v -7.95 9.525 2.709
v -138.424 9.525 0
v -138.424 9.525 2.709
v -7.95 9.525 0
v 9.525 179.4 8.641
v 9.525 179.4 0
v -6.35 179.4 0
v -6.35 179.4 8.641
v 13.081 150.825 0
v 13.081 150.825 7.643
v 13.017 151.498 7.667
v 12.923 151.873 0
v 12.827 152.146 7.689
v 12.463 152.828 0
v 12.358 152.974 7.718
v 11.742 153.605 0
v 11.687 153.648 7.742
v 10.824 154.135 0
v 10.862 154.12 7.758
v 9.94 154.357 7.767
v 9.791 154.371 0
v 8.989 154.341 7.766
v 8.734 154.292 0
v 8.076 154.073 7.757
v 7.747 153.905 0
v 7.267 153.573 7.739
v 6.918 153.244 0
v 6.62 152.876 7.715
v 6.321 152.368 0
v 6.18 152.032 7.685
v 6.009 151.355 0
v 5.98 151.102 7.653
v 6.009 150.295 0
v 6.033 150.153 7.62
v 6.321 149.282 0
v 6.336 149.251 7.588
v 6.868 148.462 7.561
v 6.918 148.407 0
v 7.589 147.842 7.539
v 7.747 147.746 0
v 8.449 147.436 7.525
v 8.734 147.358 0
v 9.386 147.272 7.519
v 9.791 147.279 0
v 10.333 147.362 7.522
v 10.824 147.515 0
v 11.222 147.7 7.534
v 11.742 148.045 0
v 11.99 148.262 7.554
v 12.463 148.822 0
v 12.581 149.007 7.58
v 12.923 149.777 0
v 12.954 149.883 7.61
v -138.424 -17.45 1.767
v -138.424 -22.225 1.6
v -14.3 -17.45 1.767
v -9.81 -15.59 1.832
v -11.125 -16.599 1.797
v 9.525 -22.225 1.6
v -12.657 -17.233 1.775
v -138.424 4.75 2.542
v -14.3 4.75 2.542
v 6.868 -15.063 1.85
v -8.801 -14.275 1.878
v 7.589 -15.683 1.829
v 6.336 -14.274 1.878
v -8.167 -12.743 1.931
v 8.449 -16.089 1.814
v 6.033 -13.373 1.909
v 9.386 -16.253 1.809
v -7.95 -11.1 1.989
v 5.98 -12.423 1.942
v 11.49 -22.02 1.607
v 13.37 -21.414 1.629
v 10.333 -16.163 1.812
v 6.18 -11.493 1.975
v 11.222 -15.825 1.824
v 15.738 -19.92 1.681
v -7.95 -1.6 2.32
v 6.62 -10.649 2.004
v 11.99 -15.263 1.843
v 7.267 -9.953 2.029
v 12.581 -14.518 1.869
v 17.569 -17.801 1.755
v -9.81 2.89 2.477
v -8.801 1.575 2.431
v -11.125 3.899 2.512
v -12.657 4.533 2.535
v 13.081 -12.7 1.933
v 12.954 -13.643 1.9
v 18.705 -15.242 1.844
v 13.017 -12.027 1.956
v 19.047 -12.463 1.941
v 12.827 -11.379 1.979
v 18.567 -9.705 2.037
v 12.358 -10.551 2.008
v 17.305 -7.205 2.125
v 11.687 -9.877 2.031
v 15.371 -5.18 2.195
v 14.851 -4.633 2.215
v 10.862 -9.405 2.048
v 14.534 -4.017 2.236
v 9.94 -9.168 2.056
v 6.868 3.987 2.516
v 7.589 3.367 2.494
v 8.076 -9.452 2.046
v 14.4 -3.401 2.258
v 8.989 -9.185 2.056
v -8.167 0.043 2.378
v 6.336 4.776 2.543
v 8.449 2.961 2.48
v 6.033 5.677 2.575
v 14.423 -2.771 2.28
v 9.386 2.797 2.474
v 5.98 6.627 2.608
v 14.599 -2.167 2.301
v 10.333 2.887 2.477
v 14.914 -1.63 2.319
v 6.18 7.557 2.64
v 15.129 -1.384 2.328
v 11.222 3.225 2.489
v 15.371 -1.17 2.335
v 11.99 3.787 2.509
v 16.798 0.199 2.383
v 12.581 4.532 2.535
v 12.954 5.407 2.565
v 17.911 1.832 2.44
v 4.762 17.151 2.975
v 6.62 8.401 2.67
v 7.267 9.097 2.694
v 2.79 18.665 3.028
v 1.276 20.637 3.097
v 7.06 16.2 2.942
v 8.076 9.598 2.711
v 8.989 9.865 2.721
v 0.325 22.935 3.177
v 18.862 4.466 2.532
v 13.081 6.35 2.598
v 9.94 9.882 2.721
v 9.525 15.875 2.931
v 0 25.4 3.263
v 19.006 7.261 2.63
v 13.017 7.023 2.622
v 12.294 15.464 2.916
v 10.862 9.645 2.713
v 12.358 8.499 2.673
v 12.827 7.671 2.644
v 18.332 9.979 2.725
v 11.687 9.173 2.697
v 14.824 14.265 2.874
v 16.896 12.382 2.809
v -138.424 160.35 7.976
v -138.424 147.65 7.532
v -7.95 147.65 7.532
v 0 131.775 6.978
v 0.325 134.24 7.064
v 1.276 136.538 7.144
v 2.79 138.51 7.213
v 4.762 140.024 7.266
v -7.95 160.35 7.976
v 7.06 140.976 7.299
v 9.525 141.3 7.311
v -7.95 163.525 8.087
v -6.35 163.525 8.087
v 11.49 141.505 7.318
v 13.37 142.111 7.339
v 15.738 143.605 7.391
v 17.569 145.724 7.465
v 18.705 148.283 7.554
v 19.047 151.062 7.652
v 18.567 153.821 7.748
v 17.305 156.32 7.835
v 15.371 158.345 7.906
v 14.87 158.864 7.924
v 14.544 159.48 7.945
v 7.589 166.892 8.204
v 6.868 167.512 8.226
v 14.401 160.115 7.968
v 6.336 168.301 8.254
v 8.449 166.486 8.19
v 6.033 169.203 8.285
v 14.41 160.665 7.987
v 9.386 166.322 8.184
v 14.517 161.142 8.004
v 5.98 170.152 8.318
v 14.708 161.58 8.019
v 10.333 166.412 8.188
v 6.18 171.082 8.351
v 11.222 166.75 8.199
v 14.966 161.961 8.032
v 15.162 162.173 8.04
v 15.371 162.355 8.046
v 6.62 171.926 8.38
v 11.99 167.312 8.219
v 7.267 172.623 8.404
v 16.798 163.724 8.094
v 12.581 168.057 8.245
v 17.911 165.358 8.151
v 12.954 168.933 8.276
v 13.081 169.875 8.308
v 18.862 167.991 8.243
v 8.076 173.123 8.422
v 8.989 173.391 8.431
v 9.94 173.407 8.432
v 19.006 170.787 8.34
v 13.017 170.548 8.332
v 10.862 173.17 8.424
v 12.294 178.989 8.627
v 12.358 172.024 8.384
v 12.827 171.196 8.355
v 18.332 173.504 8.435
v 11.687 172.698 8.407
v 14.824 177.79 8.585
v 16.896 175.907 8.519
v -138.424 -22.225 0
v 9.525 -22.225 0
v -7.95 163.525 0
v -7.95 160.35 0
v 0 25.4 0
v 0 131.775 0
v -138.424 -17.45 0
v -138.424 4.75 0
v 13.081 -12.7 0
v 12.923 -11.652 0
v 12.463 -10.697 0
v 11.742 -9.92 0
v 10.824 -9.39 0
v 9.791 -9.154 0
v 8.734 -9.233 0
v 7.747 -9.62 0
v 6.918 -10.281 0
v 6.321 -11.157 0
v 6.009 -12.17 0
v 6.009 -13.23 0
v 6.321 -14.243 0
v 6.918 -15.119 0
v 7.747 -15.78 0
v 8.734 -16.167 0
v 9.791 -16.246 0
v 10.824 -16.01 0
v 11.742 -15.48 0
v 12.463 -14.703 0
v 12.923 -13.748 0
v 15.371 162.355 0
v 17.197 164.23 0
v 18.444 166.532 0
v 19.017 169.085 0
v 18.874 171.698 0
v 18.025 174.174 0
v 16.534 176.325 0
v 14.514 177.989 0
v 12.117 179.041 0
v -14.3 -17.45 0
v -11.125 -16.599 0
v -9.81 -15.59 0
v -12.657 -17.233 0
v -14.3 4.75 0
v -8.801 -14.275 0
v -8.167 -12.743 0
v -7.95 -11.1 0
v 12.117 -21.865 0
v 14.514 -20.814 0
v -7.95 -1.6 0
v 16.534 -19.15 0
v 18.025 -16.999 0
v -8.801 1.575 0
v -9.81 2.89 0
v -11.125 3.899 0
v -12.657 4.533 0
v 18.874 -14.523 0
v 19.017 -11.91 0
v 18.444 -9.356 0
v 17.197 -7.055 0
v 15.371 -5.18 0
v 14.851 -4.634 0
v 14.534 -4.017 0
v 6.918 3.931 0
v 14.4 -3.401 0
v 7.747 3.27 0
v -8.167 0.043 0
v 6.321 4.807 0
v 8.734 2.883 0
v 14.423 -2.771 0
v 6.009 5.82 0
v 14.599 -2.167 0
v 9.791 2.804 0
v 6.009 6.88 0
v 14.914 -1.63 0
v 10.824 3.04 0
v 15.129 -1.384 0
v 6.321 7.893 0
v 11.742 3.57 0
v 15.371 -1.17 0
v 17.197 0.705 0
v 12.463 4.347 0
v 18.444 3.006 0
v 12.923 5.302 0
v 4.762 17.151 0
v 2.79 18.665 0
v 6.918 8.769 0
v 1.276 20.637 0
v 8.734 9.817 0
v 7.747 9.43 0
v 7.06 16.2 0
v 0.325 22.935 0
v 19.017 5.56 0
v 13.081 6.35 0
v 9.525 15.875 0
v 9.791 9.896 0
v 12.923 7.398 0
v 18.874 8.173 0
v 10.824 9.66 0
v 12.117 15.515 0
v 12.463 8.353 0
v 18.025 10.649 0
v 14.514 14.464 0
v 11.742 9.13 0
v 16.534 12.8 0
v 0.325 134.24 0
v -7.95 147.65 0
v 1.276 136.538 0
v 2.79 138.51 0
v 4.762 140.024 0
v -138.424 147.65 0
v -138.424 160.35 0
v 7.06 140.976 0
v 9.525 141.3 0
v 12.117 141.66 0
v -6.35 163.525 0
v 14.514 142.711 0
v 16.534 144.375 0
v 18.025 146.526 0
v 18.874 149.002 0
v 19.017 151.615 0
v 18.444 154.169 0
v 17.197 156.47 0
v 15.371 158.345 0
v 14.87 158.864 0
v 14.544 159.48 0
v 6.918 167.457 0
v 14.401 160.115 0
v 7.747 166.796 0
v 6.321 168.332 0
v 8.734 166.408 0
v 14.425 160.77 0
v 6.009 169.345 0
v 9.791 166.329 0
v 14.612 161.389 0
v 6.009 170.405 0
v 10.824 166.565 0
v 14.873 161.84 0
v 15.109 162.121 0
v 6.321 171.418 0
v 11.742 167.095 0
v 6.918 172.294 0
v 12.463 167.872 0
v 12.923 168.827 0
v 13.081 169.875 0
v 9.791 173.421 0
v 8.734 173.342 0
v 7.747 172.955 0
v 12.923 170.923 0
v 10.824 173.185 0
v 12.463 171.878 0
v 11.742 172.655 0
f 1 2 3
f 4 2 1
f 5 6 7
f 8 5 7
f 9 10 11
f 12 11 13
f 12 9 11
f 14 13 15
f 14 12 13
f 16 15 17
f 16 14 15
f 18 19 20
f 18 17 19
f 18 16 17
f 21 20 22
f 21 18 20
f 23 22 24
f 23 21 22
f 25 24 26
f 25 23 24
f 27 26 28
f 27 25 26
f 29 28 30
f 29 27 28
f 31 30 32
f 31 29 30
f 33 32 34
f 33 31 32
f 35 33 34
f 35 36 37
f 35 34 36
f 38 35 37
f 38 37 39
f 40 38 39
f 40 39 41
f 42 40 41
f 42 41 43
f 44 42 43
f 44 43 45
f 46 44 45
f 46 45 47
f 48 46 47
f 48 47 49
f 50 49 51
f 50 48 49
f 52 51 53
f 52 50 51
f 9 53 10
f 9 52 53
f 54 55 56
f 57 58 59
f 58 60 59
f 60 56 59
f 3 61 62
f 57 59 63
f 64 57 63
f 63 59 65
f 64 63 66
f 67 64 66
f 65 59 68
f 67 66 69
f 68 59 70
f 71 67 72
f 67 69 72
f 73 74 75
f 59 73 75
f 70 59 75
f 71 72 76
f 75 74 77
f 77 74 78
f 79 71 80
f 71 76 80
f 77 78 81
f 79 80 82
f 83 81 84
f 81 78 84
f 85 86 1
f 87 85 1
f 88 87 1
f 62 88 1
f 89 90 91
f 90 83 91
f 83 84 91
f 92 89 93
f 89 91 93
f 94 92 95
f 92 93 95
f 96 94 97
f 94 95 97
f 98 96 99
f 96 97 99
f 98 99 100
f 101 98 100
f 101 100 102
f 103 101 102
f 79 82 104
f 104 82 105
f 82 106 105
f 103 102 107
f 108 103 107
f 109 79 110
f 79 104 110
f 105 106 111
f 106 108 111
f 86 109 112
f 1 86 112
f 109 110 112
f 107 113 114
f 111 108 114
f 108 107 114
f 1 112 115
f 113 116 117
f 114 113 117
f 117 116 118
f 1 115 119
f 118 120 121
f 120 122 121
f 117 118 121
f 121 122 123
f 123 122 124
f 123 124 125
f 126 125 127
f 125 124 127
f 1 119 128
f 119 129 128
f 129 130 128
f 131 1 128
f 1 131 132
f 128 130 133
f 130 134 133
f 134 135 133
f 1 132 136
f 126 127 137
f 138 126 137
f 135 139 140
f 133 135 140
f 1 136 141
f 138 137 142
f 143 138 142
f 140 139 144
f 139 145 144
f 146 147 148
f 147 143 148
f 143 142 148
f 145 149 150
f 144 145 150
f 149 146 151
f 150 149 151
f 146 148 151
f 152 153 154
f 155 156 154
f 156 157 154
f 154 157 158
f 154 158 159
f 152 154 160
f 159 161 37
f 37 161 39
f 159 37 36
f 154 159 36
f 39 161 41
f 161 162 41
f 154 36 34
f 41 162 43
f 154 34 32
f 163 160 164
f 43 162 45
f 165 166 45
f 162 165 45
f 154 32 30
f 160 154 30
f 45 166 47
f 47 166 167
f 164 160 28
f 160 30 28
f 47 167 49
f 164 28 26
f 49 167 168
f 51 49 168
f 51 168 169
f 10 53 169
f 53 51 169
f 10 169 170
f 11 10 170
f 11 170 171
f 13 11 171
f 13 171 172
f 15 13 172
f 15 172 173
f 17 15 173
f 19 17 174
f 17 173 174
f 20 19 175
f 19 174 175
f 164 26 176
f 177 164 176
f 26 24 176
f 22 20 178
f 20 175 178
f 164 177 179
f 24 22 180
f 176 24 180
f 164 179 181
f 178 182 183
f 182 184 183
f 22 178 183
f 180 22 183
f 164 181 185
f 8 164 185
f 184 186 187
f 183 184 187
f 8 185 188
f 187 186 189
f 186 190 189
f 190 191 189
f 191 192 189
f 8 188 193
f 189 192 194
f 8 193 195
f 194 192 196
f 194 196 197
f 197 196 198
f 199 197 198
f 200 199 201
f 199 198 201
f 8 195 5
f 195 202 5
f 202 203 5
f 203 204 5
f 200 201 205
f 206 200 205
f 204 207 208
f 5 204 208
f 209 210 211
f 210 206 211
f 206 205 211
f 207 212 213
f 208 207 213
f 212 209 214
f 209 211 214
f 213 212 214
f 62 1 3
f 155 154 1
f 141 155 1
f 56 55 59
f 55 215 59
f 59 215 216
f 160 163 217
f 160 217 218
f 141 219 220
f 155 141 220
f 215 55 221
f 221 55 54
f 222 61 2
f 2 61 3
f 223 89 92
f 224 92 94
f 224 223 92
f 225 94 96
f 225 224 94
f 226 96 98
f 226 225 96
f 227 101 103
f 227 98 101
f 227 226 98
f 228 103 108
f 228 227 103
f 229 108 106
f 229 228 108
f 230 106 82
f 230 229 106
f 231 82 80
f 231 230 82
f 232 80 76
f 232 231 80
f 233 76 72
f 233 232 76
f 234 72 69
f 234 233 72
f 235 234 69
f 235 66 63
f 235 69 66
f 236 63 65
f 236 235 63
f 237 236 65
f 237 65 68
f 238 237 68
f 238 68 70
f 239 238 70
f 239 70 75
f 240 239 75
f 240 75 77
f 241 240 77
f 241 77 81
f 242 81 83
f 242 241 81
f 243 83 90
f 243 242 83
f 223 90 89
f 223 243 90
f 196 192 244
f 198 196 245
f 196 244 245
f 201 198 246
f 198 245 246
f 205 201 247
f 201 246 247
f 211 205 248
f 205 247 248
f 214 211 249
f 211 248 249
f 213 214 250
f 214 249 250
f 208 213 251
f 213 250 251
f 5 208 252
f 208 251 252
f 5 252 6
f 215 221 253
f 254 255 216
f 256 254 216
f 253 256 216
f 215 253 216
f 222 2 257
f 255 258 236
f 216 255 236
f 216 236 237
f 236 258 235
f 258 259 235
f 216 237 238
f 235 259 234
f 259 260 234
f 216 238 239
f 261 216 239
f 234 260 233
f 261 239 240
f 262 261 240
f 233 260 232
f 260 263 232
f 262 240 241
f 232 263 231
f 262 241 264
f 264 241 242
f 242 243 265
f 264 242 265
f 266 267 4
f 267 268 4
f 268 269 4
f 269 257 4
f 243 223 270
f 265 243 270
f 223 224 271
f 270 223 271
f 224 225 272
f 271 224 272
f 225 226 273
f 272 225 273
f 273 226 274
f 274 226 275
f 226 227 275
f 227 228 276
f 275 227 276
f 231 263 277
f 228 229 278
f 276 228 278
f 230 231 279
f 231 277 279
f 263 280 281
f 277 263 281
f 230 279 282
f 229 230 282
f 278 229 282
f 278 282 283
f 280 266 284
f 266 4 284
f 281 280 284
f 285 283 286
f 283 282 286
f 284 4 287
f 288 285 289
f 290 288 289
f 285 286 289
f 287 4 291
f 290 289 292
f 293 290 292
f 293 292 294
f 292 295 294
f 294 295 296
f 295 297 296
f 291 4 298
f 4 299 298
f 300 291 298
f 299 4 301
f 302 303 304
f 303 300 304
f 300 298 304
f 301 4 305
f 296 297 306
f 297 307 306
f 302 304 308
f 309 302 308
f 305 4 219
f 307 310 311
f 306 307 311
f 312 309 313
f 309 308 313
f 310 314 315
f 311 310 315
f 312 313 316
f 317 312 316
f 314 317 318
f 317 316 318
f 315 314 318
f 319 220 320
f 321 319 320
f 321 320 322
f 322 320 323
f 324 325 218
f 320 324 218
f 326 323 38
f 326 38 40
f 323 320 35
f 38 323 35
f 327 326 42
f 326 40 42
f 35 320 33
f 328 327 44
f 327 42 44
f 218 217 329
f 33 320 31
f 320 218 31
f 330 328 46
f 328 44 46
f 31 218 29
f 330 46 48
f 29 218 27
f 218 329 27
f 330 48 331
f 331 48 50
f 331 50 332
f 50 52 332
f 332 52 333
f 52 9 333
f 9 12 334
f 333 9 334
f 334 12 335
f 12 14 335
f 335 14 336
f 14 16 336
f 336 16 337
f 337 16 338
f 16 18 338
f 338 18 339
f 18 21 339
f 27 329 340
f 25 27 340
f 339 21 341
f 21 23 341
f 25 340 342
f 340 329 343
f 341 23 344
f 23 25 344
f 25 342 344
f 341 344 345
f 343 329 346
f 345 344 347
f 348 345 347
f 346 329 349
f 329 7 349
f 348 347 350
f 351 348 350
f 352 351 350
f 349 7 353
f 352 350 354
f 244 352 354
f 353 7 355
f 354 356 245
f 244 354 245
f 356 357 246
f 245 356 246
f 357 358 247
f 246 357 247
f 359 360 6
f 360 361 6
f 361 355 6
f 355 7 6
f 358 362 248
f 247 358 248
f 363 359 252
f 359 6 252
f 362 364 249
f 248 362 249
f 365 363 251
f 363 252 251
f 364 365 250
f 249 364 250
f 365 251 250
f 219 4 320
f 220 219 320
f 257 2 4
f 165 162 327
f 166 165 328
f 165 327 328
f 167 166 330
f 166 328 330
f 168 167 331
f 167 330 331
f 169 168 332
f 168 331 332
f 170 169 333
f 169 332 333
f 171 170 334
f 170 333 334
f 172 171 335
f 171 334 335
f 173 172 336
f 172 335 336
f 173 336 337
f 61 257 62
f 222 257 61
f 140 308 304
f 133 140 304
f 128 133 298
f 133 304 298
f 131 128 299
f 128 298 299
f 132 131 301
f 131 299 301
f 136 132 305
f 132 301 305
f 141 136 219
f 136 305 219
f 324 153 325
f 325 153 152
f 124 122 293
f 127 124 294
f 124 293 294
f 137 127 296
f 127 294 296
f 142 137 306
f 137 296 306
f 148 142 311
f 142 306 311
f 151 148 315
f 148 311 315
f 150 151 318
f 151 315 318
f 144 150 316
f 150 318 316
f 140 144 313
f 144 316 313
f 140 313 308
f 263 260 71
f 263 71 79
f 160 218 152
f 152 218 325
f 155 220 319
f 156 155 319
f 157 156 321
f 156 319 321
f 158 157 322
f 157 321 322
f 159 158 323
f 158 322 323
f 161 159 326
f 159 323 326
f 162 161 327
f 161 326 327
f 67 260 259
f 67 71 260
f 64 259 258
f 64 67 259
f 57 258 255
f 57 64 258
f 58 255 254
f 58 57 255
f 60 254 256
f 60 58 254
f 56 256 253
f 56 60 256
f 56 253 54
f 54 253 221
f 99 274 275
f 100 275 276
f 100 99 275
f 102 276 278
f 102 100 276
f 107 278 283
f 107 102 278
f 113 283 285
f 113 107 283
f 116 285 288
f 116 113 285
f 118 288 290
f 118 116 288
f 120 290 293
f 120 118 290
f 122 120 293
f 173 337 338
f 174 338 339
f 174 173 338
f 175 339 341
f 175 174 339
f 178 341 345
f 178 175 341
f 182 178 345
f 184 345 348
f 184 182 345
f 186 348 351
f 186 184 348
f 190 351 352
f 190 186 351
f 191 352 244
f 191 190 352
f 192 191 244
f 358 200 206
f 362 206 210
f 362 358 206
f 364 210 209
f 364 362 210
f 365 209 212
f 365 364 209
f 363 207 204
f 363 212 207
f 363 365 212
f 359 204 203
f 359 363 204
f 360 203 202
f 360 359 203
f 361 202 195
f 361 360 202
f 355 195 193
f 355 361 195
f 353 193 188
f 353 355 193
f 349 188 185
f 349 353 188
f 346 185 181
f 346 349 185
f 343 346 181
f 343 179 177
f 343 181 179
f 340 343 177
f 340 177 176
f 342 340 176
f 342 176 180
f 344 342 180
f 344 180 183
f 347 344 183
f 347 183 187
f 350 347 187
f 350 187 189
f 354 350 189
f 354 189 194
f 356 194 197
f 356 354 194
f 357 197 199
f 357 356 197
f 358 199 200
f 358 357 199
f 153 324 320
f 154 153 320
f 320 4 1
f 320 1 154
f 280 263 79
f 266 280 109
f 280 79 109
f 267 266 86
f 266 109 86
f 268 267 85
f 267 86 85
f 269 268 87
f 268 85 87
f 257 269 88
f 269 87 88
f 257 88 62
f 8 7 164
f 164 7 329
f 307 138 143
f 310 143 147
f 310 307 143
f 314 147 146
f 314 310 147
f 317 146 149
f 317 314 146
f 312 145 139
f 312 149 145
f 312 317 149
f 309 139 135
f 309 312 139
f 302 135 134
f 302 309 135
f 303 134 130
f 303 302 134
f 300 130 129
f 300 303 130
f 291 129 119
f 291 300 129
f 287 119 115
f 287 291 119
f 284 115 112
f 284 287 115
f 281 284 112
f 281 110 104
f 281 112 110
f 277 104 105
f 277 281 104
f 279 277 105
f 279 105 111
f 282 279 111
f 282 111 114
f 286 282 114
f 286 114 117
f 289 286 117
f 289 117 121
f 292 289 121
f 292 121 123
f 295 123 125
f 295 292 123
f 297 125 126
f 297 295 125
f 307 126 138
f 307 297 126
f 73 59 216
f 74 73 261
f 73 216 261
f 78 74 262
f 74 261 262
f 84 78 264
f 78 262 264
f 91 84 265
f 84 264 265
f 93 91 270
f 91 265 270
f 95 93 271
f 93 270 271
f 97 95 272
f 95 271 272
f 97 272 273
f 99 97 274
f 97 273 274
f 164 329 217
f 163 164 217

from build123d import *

# Parameters (mm, degrees)
BOSS_EXTRUDE1_OUTLINE_R = 3.556
BOSS_EXTRUDE1_OUTLINE_W = 260.9469
BOSS_EXTRUDE1_OUTLINE_H = 138.1252
BOSS_EXTRUDE1_DEPTH     = 76.2
CUT_EXTRUDE1_DEPTH      = 355.32482824
CUT_EXTRUDE1_DEPTH_BACK = 355.32482824
FILLET1_R               = 2.54
SKETCH7_W               = 260.9469
SKETCH7_H               = 22.1996
CUT_EXTRUDE2_DEPTH      = 347.152897849
FILLET2_R               = 6.35
SKETCH8_W               = 208.809057266
SKETCH8_H               = 235.521960295
CUT_EXTRUDE4_DEPTH      = 347.144751077


# Read off the part's stored shape, not the designer's step: Boss-Extrude1
with BuildPart() as part:
    # Boss-Extrude1 outline → Boss-Extrude1 (new body)
    with BuildSketch(Plane.XY):
        with BuildLine():
            Line((-286.3596, -22.225), (9.525, -22.225))
            ThreePointArc((9.525, -22.225), (19.05, -12.7), (9.525, -3.175))
            ThreePointArc((9.525, -3.175), (19.05, 6.35), (9.525, 15.875))
            ThreePointArc((9.525, 15.875), (2.789807909, 18.664807909), (0, 25.4))
            Line((0, 25.4), (0, 131.7752))
            ThreePointArc((0, 131.7752), (2.789807909, 138.510392091), (9.525, 141.3002))
            ThreePointArc((9.525, 141.3002), (19.05, 150.8252), (9.525, 160.3502))
            ThreePointArc((9.525, 160.3502), (19.05, 169.8752), (9.525, 179.4002))
            Line((9.525, 179.4002), (-6.35, 179.4002))
            Line((-6.35, 179.4002), (-6.35, 163.5252))
            Line((-6.35, 163.5252), (-7.9502, 163.5252))
            Line((-7.9502, 163.5252), (-7.9502, 160.3502))
            Line((-7.9502, 160.3502), (-268.9098, 160.3502))
            Line((-268.9098, 160.3502), (-268.9098, 163.5252))
            Line((-268.9098, 163.5252), (-270.51, 163.5252))
            Line((-270.51, 163.5252), (-270.51, 179.4002))
            Line((-270.51, 179.4002), (-286.385, 179.4002))
            ThreePointArc((-286.385, 179.4002), (-295.91, 169.8752), (-286.385, 160.3502))
            ThreePointArc((-286.385, 160.3502), (-295.897297883, 150.818850004), (-286.3723, 141.3002))
            ThreePointArc((-286.3723, 141.3002), (-279.637107909, 138.510392091), (-276.8473, 131.7752))
            Line((-276.8473, 131.7752), (-276.8473, 25.4))
            ThreePointArc((-276.8473, 25.4), (-279.637107909, 18.664807909), (-286.3723, 15.875))
            ThreePointArc((-286.3723, 15.875), (-295.8973, 6.35), (-286.3723, -3.175))
            ThreePointArc((-286.3723, -3.175), (-295.884597883, -12.706349996), (-286.3596, -22.225))
        make_face()
        with Locations((-286.3596, -12.7)):
            Circle(BOSS_EXTRUDE1_OUTLINE_R, mode=Mode.SUBTRACT)
        with Locations((-286.3723, 6.35)):
            Circle(BOSS_EXTRUDE1_OUTLINE_R, mode=Mode.SUBTRACT)
        with Locations((9.525, -12.7)):
            Circle(BOSS_EXTRUDE1_OUTLINE_R, mode=Mode.SUBTRACT)
        with Locations((9.525, 6.35)):
            Circle(BOSS_EXTRUDE1_OUTLINE_R, mode=Mode.SUBTRACT)
        with Locations((-286.3723, 150.8252)):
            Circle(BOSS_EXTRUDE1_OUTLINE_R, mode=Mode.SUBTRACT)
        with Locations((-286.385, 169.8752)):
            Circle(BOSS_EXTRUDE1_OUTLINE_R, mode=Mode.SUBTRACT)
        with Locations((-138.42365, 78.5876)):
            Rectangle(BOSS_EXTRUDE1_OUTLINE_W, BOSS_EXTRUDE1_OUTLINE_H, mode=Mode.SUBTRACT)
        with Locations((9.525, 150.8252)):
            Circle(BOSS_EXTRUDE1_OUTLINE_R, mode=Mode.SUBTRACT)
        with Locations((9.525, 169.8752)):
            Circle(BOSS_EXTRUDE1_OUTLINE_R, mode=Mode.SUBTRACT)
    extrude(amount=BOSS_EXTRUDE1_DEPTH)

    # Sketch5 → Cut-Extrude1 (cut, two sides: drawn at the far end of the back side and taken through both)
    with BuildSketch(Plane.ZY.offset(276.8473).offset(-CUT_EXTRUDE1_DEPTH_BACK)):
        Polygon((1.6002, -22.225), (8.641107133, 179.4002), (76.2, 179.4002), (76.2, -22.225), align=None)
    extrude(amount=CUT_EXTRUDE1_DEPTH + CUT_EXTRUDE1_DEPTH_BACK, mode=Mode.SUBTRACT)

    # Fillet1
    fillet1_edges = [part.edges().sort_by_distance(p)[0] for p in [
        (-286.385, 160.3502, 3.987933237),
        (-286.3723, -3.175, 1.132720329),
        (9.525, -3.175, 1.132720329),
        (9.525, 160.3502, 3.987933237),
    ]]
    fillet(fillet1_edges, radius=FILLET1_R)

    # Sketch7 → Cut-Extrude2 (cut, through all)
    with BuildSketch(Plane(origin=(0, 0, 0), x_dir=(-1, 0, 0), z_dir=(0, 0, -1))):
        with Locations((138.42365, -6.35)):
            Rectangle(SKETCH7_W, SKETCH7_H)
    extrude(amount=-CUT_EXTRUDE2_DEPTH, mode=Mode.SUBTRACT)

    # Fillet2
    fillet2_edges = [part.edges().sort_by_distance(p)[0] for p in [
        (-268.8971, 4.7498, 1.271090386),
        (-268.8971, -17.4498, 0.883476829),
        (-7.9502, -17.4498, 0.883476829),
        (-7.9502, 4.7498, 1.271090386),
    ]]
    fillet(fillet2_edges, radius=FILLET2_R)

    # Sketch8 → Cut-Extrude4 (cut, through all)
    with BuildSketch(Plane(origin=(0, -0.082881646, 2.373419811), x_dir=(1, 0, 0), z_dir=(0, -0.03489949670250444, 0.9993908270190958))):
        with Locations((-242.828178633, 74.917246318)):
            Rectangle(SKETCH8_W, SKETCH8_H)
    extrude(amount=-CUT_EXTRUDE4_DEPTH, mode=Mode.SUBTRACT)


solid = part.part
